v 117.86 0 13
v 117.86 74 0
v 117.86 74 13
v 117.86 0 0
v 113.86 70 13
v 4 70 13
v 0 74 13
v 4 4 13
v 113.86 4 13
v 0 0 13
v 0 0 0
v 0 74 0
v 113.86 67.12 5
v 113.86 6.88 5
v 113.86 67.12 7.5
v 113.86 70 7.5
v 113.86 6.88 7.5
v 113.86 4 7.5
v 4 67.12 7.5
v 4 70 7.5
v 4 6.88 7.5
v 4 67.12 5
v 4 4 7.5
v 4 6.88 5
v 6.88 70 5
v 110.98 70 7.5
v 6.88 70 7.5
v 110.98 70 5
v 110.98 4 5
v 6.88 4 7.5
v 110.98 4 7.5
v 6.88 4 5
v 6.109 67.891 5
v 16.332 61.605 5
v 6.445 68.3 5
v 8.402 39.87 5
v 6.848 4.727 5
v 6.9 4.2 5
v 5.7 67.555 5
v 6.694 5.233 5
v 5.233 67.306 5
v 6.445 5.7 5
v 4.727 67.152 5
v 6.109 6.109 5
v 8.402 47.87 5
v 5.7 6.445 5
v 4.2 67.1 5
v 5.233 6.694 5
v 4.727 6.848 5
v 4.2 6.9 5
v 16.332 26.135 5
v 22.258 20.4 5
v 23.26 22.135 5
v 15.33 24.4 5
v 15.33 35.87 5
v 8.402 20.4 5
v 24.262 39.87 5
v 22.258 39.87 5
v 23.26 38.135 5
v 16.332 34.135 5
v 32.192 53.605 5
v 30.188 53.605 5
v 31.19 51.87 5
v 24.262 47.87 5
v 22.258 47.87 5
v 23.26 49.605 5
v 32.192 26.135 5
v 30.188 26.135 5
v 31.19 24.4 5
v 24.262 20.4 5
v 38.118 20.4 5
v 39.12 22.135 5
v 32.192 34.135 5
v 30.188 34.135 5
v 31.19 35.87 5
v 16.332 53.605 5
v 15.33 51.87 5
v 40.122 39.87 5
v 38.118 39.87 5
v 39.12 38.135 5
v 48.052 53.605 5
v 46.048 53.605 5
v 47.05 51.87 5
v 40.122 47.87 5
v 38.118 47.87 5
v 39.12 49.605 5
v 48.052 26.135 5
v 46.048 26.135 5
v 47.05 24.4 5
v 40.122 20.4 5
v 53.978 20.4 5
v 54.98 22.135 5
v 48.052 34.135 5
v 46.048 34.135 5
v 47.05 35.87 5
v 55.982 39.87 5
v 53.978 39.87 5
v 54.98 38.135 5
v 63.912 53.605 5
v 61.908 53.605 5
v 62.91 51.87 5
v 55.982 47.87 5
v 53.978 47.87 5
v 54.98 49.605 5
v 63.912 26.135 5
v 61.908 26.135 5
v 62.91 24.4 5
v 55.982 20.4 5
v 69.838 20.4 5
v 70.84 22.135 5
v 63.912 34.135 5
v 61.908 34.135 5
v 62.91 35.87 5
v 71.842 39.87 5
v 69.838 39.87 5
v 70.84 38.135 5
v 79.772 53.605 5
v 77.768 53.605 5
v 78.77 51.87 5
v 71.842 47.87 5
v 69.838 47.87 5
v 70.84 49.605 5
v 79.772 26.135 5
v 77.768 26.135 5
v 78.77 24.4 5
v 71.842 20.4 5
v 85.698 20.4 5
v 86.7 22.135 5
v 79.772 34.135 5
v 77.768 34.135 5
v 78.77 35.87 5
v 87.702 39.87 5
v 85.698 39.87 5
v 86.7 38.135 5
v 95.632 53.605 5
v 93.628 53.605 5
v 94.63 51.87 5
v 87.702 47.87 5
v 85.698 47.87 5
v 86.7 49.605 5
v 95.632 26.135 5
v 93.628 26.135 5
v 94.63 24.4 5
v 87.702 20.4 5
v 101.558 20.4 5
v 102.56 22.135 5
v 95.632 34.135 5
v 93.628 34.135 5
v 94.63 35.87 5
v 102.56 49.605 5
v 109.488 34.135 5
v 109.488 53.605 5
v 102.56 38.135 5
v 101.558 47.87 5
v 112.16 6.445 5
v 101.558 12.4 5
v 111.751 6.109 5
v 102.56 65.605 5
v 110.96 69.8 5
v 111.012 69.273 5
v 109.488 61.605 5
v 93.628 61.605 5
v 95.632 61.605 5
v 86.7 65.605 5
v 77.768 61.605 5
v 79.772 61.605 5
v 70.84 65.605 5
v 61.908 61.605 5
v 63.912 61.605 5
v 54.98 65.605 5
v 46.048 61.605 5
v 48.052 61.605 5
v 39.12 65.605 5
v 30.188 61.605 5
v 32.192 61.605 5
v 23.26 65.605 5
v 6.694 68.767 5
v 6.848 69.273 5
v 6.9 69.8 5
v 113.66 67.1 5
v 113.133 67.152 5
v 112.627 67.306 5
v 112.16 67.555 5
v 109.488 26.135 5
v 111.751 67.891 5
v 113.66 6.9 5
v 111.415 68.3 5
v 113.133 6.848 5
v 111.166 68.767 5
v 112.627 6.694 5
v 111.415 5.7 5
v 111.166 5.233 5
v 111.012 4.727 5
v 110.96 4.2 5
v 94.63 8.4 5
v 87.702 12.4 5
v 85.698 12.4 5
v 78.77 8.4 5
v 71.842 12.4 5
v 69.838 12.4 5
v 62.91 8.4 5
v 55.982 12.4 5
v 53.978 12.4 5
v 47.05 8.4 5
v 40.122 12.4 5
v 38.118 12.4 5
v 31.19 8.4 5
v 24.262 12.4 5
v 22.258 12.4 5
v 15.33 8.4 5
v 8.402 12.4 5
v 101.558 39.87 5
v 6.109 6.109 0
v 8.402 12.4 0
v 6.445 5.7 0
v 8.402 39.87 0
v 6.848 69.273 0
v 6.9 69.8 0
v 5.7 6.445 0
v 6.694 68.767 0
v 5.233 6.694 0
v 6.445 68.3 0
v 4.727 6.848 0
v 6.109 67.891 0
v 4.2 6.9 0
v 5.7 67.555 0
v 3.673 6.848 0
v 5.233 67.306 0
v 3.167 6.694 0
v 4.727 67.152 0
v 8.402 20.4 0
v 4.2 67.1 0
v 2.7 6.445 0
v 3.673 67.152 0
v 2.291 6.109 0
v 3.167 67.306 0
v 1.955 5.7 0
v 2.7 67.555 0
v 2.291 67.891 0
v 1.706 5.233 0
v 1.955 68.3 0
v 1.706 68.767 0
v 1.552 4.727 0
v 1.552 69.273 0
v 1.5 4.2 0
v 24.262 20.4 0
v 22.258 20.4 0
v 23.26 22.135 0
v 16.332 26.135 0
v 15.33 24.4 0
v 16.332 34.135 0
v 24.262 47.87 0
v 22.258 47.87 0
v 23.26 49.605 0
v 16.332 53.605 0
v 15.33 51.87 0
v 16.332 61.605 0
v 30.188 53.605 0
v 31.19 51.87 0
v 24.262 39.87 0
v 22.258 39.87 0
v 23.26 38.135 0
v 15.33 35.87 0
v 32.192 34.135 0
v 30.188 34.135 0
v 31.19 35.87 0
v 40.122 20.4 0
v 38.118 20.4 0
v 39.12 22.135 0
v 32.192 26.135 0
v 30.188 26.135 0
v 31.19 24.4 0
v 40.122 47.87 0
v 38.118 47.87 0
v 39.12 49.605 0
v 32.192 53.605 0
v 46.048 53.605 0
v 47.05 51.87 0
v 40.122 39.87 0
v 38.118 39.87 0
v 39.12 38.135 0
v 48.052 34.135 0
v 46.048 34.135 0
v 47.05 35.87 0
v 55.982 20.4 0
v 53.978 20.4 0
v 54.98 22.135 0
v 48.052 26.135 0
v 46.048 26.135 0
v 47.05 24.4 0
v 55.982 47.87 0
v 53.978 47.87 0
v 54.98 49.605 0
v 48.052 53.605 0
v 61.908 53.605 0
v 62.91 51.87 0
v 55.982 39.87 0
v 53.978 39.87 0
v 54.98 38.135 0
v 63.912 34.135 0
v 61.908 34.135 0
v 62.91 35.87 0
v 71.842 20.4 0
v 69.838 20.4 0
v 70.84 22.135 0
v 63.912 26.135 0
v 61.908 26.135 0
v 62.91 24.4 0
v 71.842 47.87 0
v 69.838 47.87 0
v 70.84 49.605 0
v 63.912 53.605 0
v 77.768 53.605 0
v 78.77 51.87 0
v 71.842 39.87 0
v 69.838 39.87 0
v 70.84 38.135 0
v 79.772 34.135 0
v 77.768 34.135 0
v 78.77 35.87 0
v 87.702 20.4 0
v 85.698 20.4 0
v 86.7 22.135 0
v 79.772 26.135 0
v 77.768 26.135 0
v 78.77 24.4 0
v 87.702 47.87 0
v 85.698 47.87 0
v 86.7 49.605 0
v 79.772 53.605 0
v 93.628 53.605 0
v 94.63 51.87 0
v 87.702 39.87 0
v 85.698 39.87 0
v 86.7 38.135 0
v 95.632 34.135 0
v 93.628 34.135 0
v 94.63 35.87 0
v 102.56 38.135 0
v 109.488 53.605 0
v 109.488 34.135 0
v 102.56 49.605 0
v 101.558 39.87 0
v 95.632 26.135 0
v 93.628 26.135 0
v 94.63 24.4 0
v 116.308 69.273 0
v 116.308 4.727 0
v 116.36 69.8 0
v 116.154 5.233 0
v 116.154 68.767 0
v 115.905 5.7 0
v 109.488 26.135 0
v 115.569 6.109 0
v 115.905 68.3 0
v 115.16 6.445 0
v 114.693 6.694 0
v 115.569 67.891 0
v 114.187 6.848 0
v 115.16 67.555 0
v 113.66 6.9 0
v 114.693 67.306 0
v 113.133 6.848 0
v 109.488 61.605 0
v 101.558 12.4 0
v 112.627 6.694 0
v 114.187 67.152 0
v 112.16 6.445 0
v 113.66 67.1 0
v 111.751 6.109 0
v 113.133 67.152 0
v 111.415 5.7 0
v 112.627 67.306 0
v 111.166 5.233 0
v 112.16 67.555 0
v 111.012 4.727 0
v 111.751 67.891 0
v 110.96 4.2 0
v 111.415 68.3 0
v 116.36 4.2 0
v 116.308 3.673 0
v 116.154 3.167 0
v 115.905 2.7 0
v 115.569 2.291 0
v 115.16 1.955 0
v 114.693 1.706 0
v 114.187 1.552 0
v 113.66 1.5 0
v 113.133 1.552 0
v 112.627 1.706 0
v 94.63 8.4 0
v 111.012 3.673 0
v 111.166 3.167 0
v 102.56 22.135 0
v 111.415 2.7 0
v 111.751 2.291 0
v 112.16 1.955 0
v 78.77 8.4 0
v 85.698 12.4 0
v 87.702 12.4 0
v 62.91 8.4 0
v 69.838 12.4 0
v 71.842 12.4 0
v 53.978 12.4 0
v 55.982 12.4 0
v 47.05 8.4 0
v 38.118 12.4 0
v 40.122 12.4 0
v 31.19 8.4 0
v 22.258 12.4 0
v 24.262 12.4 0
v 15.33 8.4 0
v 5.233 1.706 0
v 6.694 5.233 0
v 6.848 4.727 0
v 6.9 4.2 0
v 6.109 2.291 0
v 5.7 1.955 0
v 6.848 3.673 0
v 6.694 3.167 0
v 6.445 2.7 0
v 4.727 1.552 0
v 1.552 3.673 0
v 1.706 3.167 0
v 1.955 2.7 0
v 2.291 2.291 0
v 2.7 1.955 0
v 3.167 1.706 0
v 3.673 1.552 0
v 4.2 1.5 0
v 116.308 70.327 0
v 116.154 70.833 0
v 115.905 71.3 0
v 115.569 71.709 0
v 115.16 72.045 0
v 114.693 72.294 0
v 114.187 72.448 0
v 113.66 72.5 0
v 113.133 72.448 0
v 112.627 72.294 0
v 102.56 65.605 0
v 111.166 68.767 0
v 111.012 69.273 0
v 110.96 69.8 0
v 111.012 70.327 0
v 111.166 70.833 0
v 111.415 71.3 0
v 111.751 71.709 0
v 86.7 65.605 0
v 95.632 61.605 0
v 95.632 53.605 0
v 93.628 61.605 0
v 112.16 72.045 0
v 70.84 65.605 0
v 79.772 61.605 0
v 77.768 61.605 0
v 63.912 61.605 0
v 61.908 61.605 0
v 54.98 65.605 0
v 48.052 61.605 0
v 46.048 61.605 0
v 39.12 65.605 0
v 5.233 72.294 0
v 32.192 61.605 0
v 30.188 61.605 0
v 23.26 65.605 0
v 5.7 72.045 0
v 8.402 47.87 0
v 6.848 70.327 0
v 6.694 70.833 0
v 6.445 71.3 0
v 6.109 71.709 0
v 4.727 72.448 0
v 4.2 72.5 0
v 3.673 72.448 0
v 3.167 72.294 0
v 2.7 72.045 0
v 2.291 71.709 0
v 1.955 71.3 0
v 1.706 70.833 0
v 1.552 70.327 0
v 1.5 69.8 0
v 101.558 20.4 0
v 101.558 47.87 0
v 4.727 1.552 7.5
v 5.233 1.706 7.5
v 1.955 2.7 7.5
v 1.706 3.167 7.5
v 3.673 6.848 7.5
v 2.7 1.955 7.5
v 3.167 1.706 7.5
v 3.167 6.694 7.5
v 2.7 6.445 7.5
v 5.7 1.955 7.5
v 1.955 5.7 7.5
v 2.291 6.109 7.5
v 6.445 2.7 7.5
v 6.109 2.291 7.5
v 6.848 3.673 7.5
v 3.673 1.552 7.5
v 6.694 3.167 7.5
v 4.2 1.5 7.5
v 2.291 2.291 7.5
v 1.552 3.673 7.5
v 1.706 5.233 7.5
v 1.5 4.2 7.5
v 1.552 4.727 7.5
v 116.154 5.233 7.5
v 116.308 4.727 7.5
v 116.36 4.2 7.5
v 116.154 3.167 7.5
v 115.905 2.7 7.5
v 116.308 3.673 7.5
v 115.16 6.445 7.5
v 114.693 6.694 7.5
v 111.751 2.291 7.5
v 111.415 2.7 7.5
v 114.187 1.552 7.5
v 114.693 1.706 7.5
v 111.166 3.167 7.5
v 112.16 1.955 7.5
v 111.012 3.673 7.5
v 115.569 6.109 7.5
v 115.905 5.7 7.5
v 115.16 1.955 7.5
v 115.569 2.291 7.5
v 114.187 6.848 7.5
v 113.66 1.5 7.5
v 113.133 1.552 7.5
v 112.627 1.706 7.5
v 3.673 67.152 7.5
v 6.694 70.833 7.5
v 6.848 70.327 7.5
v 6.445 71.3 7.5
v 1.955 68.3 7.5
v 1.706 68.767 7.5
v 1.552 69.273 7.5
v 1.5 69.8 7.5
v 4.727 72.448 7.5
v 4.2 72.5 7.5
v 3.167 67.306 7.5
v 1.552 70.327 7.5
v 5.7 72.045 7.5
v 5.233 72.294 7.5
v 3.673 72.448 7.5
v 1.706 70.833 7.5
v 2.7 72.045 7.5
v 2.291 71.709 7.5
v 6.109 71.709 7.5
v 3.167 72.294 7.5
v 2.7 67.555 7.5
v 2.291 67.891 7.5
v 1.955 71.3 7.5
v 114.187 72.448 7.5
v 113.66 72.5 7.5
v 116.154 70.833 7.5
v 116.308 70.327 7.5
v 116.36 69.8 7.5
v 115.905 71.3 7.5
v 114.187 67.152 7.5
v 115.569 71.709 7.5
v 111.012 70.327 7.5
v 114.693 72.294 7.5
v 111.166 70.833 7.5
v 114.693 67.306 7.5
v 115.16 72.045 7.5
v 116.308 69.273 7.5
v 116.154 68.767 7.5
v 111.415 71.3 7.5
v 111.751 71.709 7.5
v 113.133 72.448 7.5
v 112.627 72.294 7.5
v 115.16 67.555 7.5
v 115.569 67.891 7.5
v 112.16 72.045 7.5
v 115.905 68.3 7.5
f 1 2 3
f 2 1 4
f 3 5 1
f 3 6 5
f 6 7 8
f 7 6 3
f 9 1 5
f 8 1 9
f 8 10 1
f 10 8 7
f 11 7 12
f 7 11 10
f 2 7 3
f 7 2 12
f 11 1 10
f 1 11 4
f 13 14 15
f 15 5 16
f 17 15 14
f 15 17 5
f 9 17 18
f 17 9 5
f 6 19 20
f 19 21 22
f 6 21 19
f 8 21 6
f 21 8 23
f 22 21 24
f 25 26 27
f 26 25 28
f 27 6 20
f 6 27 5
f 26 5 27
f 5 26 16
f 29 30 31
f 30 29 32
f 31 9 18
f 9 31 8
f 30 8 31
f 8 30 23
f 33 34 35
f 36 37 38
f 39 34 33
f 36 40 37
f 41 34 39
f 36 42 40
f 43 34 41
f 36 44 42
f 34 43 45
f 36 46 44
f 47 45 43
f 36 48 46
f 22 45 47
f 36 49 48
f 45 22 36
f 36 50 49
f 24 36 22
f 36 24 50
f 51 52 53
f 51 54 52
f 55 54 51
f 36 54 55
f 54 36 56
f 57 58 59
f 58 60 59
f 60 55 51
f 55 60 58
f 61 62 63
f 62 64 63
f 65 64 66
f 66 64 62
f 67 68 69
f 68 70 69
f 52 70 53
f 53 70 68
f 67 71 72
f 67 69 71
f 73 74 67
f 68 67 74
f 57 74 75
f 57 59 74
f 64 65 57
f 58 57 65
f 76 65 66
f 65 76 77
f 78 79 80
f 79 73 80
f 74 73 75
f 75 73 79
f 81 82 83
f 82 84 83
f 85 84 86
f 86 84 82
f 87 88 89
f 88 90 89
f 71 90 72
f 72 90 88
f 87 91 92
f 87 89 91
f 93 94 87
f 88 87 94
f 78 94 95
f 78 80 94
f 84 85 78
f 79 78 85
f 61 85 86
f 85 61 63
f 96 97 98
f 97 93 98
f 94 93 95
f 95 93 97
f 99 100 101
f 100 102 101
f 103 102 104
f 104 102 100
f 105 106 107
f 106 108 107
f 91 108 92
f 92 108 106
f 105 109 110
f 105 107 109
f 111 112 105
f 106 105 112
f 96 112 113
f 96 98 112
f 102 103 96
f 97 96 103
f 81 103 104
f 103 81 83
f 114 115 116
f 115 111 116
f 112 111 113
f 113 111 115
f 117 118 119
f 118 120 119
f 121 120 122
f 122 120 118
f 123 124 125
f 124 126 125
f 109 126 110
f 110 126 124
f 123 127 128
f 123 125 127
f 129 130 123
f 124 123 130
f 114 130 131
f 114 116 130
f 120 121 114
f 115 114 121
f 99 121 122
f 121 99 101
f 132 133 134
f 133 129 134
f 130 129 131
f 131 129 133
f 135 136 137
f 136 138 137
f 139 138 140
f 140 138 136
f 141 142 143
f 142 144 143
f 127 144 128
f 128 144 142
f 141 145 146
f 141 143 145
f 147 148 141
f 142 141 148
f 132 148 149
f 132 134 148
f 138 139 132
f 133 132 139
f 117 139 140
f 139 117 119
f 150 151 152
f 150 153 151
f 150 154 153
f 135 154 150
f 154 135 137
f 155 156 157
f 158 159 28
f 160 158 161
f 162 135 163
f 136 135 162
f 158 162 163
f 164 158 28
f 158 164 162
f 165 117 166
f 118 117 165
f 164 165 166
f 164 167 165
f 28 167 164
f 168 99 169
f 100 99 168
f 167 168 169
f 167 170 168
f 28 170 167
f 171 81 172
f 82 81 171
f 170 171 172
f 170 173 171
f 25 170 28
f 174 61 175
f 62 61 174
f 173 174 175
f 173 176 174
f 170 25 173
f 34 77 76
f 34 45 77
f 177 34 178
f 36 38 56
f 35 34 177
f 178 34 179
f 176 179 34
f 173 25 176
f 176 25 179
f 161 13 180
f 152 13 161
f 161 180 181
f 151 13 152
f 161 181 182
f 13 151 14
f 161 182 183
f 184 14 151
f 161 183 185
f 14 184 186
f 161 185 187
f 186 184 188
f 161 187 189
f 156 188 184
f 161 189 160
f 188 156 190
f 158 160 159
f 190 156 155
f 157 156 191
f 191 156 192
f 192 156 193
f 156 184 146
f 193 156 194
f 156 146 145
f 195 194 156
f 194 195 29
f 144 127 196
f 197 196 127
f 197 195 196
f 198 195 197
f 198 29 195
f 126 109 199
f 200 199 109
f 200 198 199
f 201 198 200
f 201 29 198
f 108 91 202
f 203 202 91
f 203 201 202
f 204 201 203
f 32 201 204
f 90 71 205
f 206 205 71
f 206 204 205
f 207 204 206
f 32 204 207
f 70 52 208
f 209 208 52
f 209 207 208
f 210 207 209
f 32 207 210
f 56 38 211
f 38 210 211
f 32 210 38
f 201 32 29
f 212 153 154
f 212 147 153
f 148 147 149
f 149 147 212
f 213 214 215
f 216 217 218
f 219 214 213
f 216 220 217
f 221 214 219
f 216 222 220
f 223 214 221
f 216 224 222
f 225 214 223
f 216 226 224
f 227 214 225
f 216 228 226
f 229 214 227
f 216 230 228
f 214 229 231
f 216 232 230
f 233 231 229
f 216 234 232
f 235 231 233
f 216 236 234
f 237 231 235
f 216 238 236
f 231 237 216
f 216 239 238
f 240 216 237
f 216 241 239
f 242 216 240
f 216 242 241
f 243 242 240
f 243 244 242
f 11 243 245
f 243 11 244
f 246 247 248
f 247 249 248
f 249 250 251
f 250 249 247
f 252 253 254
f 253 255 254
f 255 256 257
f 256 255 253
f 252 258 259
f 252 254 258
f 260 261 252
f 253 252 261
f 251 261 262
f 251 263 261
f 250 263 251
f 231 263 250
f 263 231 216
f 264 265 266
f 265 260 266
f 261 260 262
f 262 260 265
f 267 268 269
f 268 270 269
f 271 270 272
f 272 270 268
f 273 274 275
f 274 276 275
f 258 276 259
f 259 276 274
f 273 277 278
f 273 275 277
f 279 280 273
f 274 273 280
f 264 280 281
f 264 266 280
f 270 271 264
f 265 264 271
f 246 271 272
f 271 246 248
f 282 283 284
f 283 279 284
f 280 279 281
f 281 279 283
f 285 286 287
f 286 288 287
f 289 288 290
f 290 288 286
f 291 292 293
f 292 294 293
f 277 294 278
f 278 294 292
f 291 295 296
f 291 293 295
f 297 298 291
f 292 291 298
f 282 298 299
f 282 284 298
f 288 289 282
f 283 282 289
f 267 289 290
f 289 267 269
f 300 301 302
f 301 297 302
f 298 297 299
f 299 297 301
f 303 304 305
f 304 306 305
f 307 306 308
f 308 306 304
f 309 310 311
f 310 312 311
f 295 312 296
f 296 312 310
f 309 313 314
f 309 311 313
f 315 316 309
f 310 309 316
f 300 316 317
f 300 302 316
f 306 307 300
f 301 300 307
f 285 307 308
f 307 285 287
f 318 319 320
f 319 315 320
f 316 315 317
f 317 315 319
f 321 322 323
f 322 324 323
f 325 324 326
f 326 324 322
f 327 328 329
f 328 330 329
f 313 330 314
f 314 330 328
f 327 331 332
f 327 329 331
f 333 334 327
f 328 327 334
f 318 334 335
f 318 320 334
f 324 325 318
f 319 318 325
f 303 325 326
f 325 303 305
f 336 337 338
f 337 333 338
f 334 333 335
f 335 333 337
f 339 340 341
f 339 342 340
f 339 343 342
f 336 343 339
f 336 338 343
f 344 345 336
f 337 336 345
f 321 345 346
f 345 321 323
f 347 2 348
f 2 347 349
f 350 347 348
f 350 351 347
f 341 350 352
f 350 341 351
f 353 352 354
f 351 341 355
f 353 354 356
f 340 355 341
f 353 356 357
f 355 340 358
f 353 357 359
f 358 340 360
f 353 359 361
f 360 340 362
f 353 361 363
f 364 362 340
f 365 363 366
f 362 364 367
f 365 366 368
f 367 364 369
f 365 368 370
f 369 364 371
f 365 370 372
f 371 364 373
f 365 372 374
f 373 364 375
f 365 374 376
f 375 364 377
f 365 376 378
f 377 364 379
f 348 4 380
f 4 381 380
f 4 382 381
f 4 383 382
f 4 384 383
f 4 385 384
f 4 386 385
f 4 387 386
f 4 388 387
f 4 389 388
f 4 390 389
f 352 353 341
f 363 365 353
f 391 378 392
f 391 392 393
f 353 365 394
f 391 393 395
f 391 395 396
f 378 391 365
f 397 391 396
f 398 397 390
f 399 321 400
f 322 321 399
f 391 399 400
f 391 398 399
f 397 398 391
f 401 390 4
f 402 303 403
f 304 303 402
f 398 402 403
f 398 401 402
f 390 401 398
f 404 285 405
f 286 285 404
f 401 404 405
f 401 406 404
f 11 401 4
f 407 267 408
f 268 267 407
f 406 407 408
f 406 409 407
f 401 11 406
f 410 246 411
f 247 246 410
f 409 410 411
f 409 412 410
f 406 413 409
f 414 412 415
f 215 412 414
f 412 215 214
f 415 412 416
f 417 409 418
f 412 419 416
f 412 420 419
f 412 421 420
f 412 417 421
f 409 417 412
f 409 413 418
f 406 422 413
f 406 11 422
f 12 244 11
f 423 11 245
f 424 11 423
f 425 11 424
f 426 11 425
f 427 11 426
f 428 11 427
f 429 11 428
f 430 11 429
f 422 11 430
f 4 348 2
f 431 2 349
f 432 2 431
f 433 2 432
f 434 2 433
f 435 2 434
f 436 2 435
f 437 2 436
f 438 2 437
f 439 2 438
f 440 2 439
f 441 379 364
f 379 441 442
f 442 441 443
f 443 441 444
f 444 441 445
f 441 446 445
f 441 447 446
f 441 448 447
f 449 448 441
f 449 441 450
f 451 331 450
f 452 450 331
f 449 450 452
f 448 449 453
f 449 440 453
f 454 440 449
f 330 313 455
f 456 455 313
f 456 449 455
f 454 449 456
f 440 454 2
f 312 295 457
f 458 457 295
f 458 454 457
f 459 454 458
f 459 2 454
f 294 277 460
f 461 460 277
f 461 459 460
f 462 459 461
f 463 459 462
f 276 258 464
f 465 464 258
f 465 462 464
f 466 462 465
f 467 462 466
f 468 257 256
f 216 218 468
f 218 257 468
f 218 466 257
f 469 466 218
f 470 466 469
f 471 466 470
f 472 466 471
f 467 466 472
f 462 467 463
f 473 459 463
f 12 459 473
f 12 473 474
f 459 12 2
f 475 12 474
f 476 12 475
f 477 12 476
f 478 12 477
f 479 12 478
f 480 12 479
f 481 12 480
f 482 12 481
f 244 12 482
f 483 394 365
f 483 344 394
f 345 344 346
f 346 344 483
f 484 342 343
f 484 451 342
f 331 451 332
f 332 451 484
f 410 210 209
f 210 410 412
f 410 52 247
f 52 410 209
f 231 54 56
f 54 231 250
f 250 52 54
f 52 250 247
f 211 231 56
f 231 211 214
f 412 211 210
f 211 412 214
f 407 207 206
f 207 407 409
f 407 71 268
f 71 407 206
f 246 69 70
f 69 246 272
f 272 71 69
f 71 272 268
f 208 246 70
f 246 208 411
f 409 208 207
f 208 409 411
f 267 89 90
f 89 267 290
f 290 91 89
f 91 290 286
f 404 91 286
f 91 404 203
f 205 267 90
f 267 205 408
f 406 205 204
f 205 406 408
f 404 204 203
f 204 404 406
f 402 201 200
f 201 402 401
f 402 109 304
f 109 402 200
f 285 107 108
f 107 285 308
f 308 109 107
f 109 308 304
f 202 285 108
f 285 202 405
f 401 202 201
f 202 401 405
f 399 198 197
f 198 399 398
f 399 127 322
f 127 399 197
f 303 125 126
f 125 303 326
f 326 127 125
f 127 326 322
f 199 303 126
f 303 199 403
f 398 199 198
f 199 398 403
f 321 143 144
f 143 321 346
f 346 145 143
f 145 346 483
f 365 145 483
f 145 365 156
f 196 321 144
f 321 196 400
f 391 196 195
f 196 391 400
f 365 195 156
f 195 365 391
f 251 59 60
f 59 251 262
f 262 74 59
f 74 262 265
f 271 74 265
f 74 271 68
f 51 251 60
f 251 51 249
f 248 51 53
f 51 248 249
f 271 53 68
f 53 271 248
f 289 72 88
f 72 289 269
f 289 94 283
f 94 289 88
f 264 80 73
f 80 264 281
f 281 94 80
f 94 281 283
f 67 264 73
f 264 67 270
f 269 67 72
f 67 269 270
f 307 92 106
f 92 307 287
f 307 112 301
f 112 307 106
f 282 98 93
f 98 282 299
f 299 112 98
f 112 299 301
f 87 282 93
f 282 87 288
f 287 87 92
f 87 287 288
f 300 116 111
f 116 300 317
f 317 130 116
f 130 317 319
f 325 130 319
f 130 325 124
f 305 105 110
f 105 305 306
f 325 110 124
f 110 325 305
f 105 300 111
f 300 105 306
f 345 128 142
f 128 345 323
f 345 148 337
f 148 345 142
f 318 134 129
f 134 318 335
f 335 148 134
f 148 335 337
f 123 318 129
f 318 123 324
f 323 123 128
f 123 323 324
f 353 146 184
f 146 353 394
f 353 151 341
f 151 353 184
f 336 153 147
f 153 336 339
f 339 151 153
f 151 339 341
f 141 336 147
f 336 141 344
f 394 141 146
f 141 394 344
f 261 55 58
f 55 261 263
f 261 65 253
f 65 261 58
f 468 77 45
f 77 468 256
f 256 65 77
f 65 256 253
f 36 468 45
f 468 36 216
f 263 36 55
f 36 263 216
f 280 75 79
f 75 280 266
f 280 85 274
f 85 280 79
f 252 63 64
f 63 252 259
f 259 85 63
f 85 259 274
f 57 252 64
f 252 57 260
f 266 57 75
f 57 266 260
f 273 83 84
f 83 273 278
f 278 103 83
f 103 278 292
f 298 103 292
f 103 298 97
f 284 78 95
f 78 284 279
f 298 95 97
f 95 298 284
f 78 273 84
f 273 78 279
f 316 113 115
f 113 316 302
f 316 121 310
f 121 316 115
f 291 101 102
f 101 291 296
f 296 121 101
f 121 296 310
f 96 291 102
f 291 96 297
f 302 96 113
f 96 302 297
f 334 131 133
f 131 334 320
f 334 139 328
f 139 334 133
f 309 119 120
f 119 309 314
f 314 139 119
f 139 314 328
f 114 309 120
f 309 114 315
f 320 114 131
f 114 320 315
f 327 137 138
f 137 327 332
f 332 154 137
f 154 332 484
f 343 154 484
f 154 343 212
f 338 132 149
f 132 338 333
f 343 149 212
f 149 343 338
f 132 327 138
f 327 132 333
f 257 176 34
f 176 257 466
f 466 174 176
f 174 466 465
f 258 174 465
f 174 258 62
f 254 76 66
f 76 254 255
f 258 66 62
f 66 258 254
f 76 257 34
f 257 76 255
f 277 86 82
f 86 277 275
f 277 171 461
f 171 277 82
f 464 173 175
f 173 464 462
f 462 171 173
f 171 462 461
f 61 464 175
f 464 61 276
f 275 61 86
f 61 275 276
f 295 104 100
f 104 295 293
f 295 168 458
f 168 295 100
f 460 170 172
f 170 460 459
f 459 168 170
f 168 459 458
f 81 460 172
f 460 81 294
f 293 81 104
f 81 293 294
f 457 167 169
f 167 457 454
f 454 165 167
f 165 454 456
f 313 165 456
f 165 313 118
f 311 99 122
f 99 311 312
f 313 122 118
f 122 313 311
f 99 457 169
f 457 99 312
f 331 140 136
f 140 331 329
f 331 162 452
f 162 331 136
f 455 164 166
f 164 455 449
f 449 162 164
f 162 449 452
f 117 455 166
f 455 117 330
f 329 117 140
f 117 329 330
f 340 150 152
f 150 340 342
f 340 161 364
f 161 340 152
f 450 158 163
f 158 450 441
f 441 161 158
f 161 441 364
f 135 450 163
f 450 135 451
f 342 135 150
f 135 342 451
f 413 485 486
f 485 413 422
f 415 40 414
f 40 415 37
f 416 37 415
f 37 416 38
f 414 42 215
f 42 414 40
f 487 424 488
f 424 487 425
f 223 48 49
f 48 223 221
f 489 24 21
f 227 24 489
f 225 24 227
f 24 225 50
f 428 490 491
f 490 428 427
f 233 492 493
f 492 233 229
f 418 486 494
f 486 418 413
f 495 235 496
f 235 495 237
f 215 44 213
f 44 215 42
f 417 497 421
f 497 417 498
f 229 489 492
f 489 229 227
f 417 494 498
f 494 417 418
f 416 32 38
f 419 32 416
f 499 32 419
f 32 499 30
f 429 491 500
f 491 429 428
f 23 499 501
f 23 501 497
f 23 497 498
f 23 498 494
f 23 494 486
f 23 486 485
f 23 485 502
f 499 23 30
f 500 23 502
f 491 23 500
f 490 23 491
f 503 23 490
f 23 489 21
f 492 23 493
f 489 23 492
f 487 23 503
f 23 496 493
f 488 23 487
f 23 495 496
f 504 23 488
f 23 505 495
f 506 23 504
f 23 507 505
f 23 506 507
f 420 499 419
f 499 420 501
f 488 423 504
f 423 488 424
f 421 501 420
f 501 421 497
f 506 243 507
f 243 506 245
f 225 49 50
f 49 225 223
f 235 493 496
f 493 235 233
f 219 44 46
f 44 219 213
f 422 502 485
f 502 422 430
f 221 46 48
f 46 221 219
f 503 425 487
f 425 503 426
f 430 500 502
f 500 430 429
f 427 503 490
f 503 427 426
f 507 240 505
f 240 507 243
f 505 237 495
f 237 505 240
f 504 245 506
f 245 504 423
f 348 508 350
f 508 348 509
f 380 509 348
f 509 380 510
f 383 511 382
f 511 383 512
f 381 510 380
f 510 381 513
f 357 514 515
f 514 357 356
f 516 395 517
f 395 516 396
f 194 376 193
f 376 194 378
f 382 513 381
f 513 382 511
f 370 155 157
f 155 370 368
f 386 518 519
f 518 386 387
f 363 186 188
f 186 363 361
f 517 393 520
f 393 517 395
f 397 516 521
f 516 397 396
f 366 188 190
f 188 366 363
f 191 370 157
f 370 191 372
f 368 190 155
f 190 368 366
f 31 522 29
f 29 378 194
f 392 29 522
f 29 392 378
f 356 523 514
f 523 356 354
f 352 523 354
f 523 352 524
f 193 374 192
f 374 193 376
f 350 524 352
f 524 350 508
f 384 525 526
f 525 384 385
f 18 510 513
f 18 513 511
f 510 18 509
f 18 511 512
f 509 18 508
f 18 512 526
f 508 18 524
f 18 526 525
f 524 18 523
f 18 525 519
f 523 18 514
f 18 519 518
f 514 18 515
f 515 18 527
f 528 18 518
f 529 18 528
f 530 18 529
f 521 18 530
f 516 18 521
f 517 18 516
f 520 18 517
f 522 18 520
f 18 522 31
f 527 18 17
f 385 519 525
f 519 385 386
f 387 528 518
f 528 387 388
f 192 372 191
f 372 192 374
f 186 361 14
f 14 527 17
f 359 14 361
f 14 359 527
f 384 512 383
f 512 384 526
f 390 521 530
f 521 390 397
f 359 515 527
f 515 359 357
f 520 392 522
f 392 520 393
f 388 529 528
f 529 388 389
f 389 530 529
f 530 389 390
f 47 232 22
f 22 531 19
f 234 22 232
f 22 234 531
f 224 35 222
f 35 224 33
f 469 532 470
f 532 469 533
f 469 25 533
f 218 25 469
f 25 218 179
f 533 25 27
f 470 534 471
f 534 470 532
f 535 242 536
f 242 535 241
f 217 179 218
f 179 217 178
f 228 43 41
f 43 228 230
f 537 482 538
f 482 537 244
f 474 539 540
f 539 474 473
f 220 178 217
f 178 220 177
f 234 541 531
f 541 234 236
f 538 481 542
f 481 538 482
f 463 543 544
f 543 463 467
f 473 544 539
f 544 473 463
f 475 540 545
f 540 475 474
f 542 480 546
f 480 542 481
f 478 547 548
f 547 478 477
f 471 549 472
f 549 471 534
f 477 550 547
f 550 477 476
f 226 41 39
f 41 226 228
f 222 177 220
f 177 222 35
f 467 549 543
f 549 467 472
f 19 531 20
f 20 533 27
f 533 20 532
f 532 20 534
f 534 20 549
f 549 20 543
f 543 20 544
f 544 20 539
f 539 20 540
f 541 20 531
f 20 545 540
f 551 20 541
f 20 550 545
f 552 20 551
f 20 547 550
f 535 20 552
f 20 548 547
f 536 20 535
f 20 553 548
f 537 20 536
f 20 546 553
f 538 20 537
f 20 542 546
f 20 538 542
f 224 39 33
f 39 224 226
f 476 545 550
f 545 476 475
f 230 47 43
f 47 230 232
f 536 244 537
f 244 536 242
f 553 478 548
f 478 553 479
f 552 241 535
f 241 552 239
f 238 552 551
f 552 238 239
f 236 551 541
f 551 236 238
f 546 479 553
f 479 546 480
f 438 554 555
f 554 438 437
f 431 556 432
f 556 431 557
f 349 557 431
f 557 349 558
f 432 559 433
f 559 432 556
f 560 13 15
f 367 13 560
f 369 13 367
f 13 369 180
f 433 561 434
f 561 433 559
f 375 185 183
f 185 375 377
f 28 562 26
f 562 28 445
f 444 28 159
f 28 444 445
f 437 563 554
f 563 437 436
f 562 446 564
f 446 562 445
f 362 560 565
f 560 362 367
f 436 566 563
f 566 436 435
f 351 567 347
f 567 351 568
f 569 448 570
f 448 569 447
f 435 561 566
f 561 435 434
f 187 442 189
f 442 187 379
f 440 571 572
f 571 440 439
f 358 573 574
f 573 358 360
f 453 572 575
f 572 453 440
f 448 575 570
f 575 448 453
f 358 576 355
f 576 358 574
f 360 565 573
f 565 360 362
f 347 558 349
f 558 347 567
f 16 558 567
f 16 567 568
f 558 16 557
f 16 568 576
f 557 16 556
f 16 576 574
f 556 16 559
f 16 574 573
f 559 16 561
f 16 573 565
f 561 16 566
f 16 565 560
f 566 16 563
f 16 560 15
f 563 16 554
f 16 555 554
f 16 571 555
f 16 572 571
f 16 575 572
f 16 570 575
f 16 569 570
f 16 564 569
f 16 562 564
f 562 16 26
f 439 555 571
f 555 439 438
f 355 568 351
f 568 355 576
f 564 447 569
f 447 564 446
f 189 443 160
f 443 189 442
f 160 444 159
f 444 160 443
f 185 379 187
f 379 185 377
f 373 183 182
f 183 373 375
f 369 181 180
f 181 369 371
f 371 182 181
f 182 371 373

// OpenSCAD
$fn = 32;

// ----------------------------------------------------------------------
// Honeycomb panel: 117.86 x 74 mm, 24 cells of 16 mm
// ----------------------------------------------------------------------

// --- parameters (mm) ---
panel_w = 117.86;         // panel width
panel_d = 74;             // panel depth
thick = 5;                // panel thickness
cell_r = 8;               // hex cell circumradius
pitch = 15.86;            // hex cell pitch (centre to centre)
web = 2;                  // web between the cells
columns = 6;              // columns of cells
rows = 4;                 // rows of cells
cell_count = 24;          // total cells
shift_x = 15.33;          // first cell offset in x
shift_y = 16.4;           // first cell offset in y
mount_d = 5.4;            // corner mounting holes
hole_off = 4.2;           // mounting hole offset from the corners
rim_h = 13;               // rim height
rim_t = 4;                // rim wall thickness

difference() {
  union() {
    cube([panel_w, panel_d, thick]);
    /* rim around the panel, sunk 1 mm into the plate */
    translate([0, 0, thick - 1]) difference() {
      cube([panel_w, panel_d, rim_h - thick + 1]);
      translate([rim_t, rim_t, -2.5]) cube([panel_w - 2 * rim_t, panel_d - 2 * rim_t, rim_h - thick + 6]);
    }
  }
  /* hexagonal cells, point-up, cut right through the plate */
  for (row = [0 : rows - 1]) {
    for (col = [0 : columns - 1]) {
      translate([shift_x + col * pitch + (row % 2) * pitch / 2, shift_y + row * pitch * 0.866025, -2.5]) rotate([0, 0, 30]) cylinder(h = thick + 5, d = 2 * cell_r, $fn = 6);
    }
  }
  /* corner mounting holes, clear of the outer cell web */
  translate([4.2, 4.2, -2.5]) cylinder(h = thick + 5, d = mount_d);
  translate([113.66, 4.2, -2.5]) cylinder(h = thick + 5, d = mount_d);
  translate([4.2, 69.8, -2.5]) cylinder(h = thick + 5, d = mount_d);
  translate([113.66, 69.8, -2.5]) cylinder(h = thick + 5, d = mount_d);
}
